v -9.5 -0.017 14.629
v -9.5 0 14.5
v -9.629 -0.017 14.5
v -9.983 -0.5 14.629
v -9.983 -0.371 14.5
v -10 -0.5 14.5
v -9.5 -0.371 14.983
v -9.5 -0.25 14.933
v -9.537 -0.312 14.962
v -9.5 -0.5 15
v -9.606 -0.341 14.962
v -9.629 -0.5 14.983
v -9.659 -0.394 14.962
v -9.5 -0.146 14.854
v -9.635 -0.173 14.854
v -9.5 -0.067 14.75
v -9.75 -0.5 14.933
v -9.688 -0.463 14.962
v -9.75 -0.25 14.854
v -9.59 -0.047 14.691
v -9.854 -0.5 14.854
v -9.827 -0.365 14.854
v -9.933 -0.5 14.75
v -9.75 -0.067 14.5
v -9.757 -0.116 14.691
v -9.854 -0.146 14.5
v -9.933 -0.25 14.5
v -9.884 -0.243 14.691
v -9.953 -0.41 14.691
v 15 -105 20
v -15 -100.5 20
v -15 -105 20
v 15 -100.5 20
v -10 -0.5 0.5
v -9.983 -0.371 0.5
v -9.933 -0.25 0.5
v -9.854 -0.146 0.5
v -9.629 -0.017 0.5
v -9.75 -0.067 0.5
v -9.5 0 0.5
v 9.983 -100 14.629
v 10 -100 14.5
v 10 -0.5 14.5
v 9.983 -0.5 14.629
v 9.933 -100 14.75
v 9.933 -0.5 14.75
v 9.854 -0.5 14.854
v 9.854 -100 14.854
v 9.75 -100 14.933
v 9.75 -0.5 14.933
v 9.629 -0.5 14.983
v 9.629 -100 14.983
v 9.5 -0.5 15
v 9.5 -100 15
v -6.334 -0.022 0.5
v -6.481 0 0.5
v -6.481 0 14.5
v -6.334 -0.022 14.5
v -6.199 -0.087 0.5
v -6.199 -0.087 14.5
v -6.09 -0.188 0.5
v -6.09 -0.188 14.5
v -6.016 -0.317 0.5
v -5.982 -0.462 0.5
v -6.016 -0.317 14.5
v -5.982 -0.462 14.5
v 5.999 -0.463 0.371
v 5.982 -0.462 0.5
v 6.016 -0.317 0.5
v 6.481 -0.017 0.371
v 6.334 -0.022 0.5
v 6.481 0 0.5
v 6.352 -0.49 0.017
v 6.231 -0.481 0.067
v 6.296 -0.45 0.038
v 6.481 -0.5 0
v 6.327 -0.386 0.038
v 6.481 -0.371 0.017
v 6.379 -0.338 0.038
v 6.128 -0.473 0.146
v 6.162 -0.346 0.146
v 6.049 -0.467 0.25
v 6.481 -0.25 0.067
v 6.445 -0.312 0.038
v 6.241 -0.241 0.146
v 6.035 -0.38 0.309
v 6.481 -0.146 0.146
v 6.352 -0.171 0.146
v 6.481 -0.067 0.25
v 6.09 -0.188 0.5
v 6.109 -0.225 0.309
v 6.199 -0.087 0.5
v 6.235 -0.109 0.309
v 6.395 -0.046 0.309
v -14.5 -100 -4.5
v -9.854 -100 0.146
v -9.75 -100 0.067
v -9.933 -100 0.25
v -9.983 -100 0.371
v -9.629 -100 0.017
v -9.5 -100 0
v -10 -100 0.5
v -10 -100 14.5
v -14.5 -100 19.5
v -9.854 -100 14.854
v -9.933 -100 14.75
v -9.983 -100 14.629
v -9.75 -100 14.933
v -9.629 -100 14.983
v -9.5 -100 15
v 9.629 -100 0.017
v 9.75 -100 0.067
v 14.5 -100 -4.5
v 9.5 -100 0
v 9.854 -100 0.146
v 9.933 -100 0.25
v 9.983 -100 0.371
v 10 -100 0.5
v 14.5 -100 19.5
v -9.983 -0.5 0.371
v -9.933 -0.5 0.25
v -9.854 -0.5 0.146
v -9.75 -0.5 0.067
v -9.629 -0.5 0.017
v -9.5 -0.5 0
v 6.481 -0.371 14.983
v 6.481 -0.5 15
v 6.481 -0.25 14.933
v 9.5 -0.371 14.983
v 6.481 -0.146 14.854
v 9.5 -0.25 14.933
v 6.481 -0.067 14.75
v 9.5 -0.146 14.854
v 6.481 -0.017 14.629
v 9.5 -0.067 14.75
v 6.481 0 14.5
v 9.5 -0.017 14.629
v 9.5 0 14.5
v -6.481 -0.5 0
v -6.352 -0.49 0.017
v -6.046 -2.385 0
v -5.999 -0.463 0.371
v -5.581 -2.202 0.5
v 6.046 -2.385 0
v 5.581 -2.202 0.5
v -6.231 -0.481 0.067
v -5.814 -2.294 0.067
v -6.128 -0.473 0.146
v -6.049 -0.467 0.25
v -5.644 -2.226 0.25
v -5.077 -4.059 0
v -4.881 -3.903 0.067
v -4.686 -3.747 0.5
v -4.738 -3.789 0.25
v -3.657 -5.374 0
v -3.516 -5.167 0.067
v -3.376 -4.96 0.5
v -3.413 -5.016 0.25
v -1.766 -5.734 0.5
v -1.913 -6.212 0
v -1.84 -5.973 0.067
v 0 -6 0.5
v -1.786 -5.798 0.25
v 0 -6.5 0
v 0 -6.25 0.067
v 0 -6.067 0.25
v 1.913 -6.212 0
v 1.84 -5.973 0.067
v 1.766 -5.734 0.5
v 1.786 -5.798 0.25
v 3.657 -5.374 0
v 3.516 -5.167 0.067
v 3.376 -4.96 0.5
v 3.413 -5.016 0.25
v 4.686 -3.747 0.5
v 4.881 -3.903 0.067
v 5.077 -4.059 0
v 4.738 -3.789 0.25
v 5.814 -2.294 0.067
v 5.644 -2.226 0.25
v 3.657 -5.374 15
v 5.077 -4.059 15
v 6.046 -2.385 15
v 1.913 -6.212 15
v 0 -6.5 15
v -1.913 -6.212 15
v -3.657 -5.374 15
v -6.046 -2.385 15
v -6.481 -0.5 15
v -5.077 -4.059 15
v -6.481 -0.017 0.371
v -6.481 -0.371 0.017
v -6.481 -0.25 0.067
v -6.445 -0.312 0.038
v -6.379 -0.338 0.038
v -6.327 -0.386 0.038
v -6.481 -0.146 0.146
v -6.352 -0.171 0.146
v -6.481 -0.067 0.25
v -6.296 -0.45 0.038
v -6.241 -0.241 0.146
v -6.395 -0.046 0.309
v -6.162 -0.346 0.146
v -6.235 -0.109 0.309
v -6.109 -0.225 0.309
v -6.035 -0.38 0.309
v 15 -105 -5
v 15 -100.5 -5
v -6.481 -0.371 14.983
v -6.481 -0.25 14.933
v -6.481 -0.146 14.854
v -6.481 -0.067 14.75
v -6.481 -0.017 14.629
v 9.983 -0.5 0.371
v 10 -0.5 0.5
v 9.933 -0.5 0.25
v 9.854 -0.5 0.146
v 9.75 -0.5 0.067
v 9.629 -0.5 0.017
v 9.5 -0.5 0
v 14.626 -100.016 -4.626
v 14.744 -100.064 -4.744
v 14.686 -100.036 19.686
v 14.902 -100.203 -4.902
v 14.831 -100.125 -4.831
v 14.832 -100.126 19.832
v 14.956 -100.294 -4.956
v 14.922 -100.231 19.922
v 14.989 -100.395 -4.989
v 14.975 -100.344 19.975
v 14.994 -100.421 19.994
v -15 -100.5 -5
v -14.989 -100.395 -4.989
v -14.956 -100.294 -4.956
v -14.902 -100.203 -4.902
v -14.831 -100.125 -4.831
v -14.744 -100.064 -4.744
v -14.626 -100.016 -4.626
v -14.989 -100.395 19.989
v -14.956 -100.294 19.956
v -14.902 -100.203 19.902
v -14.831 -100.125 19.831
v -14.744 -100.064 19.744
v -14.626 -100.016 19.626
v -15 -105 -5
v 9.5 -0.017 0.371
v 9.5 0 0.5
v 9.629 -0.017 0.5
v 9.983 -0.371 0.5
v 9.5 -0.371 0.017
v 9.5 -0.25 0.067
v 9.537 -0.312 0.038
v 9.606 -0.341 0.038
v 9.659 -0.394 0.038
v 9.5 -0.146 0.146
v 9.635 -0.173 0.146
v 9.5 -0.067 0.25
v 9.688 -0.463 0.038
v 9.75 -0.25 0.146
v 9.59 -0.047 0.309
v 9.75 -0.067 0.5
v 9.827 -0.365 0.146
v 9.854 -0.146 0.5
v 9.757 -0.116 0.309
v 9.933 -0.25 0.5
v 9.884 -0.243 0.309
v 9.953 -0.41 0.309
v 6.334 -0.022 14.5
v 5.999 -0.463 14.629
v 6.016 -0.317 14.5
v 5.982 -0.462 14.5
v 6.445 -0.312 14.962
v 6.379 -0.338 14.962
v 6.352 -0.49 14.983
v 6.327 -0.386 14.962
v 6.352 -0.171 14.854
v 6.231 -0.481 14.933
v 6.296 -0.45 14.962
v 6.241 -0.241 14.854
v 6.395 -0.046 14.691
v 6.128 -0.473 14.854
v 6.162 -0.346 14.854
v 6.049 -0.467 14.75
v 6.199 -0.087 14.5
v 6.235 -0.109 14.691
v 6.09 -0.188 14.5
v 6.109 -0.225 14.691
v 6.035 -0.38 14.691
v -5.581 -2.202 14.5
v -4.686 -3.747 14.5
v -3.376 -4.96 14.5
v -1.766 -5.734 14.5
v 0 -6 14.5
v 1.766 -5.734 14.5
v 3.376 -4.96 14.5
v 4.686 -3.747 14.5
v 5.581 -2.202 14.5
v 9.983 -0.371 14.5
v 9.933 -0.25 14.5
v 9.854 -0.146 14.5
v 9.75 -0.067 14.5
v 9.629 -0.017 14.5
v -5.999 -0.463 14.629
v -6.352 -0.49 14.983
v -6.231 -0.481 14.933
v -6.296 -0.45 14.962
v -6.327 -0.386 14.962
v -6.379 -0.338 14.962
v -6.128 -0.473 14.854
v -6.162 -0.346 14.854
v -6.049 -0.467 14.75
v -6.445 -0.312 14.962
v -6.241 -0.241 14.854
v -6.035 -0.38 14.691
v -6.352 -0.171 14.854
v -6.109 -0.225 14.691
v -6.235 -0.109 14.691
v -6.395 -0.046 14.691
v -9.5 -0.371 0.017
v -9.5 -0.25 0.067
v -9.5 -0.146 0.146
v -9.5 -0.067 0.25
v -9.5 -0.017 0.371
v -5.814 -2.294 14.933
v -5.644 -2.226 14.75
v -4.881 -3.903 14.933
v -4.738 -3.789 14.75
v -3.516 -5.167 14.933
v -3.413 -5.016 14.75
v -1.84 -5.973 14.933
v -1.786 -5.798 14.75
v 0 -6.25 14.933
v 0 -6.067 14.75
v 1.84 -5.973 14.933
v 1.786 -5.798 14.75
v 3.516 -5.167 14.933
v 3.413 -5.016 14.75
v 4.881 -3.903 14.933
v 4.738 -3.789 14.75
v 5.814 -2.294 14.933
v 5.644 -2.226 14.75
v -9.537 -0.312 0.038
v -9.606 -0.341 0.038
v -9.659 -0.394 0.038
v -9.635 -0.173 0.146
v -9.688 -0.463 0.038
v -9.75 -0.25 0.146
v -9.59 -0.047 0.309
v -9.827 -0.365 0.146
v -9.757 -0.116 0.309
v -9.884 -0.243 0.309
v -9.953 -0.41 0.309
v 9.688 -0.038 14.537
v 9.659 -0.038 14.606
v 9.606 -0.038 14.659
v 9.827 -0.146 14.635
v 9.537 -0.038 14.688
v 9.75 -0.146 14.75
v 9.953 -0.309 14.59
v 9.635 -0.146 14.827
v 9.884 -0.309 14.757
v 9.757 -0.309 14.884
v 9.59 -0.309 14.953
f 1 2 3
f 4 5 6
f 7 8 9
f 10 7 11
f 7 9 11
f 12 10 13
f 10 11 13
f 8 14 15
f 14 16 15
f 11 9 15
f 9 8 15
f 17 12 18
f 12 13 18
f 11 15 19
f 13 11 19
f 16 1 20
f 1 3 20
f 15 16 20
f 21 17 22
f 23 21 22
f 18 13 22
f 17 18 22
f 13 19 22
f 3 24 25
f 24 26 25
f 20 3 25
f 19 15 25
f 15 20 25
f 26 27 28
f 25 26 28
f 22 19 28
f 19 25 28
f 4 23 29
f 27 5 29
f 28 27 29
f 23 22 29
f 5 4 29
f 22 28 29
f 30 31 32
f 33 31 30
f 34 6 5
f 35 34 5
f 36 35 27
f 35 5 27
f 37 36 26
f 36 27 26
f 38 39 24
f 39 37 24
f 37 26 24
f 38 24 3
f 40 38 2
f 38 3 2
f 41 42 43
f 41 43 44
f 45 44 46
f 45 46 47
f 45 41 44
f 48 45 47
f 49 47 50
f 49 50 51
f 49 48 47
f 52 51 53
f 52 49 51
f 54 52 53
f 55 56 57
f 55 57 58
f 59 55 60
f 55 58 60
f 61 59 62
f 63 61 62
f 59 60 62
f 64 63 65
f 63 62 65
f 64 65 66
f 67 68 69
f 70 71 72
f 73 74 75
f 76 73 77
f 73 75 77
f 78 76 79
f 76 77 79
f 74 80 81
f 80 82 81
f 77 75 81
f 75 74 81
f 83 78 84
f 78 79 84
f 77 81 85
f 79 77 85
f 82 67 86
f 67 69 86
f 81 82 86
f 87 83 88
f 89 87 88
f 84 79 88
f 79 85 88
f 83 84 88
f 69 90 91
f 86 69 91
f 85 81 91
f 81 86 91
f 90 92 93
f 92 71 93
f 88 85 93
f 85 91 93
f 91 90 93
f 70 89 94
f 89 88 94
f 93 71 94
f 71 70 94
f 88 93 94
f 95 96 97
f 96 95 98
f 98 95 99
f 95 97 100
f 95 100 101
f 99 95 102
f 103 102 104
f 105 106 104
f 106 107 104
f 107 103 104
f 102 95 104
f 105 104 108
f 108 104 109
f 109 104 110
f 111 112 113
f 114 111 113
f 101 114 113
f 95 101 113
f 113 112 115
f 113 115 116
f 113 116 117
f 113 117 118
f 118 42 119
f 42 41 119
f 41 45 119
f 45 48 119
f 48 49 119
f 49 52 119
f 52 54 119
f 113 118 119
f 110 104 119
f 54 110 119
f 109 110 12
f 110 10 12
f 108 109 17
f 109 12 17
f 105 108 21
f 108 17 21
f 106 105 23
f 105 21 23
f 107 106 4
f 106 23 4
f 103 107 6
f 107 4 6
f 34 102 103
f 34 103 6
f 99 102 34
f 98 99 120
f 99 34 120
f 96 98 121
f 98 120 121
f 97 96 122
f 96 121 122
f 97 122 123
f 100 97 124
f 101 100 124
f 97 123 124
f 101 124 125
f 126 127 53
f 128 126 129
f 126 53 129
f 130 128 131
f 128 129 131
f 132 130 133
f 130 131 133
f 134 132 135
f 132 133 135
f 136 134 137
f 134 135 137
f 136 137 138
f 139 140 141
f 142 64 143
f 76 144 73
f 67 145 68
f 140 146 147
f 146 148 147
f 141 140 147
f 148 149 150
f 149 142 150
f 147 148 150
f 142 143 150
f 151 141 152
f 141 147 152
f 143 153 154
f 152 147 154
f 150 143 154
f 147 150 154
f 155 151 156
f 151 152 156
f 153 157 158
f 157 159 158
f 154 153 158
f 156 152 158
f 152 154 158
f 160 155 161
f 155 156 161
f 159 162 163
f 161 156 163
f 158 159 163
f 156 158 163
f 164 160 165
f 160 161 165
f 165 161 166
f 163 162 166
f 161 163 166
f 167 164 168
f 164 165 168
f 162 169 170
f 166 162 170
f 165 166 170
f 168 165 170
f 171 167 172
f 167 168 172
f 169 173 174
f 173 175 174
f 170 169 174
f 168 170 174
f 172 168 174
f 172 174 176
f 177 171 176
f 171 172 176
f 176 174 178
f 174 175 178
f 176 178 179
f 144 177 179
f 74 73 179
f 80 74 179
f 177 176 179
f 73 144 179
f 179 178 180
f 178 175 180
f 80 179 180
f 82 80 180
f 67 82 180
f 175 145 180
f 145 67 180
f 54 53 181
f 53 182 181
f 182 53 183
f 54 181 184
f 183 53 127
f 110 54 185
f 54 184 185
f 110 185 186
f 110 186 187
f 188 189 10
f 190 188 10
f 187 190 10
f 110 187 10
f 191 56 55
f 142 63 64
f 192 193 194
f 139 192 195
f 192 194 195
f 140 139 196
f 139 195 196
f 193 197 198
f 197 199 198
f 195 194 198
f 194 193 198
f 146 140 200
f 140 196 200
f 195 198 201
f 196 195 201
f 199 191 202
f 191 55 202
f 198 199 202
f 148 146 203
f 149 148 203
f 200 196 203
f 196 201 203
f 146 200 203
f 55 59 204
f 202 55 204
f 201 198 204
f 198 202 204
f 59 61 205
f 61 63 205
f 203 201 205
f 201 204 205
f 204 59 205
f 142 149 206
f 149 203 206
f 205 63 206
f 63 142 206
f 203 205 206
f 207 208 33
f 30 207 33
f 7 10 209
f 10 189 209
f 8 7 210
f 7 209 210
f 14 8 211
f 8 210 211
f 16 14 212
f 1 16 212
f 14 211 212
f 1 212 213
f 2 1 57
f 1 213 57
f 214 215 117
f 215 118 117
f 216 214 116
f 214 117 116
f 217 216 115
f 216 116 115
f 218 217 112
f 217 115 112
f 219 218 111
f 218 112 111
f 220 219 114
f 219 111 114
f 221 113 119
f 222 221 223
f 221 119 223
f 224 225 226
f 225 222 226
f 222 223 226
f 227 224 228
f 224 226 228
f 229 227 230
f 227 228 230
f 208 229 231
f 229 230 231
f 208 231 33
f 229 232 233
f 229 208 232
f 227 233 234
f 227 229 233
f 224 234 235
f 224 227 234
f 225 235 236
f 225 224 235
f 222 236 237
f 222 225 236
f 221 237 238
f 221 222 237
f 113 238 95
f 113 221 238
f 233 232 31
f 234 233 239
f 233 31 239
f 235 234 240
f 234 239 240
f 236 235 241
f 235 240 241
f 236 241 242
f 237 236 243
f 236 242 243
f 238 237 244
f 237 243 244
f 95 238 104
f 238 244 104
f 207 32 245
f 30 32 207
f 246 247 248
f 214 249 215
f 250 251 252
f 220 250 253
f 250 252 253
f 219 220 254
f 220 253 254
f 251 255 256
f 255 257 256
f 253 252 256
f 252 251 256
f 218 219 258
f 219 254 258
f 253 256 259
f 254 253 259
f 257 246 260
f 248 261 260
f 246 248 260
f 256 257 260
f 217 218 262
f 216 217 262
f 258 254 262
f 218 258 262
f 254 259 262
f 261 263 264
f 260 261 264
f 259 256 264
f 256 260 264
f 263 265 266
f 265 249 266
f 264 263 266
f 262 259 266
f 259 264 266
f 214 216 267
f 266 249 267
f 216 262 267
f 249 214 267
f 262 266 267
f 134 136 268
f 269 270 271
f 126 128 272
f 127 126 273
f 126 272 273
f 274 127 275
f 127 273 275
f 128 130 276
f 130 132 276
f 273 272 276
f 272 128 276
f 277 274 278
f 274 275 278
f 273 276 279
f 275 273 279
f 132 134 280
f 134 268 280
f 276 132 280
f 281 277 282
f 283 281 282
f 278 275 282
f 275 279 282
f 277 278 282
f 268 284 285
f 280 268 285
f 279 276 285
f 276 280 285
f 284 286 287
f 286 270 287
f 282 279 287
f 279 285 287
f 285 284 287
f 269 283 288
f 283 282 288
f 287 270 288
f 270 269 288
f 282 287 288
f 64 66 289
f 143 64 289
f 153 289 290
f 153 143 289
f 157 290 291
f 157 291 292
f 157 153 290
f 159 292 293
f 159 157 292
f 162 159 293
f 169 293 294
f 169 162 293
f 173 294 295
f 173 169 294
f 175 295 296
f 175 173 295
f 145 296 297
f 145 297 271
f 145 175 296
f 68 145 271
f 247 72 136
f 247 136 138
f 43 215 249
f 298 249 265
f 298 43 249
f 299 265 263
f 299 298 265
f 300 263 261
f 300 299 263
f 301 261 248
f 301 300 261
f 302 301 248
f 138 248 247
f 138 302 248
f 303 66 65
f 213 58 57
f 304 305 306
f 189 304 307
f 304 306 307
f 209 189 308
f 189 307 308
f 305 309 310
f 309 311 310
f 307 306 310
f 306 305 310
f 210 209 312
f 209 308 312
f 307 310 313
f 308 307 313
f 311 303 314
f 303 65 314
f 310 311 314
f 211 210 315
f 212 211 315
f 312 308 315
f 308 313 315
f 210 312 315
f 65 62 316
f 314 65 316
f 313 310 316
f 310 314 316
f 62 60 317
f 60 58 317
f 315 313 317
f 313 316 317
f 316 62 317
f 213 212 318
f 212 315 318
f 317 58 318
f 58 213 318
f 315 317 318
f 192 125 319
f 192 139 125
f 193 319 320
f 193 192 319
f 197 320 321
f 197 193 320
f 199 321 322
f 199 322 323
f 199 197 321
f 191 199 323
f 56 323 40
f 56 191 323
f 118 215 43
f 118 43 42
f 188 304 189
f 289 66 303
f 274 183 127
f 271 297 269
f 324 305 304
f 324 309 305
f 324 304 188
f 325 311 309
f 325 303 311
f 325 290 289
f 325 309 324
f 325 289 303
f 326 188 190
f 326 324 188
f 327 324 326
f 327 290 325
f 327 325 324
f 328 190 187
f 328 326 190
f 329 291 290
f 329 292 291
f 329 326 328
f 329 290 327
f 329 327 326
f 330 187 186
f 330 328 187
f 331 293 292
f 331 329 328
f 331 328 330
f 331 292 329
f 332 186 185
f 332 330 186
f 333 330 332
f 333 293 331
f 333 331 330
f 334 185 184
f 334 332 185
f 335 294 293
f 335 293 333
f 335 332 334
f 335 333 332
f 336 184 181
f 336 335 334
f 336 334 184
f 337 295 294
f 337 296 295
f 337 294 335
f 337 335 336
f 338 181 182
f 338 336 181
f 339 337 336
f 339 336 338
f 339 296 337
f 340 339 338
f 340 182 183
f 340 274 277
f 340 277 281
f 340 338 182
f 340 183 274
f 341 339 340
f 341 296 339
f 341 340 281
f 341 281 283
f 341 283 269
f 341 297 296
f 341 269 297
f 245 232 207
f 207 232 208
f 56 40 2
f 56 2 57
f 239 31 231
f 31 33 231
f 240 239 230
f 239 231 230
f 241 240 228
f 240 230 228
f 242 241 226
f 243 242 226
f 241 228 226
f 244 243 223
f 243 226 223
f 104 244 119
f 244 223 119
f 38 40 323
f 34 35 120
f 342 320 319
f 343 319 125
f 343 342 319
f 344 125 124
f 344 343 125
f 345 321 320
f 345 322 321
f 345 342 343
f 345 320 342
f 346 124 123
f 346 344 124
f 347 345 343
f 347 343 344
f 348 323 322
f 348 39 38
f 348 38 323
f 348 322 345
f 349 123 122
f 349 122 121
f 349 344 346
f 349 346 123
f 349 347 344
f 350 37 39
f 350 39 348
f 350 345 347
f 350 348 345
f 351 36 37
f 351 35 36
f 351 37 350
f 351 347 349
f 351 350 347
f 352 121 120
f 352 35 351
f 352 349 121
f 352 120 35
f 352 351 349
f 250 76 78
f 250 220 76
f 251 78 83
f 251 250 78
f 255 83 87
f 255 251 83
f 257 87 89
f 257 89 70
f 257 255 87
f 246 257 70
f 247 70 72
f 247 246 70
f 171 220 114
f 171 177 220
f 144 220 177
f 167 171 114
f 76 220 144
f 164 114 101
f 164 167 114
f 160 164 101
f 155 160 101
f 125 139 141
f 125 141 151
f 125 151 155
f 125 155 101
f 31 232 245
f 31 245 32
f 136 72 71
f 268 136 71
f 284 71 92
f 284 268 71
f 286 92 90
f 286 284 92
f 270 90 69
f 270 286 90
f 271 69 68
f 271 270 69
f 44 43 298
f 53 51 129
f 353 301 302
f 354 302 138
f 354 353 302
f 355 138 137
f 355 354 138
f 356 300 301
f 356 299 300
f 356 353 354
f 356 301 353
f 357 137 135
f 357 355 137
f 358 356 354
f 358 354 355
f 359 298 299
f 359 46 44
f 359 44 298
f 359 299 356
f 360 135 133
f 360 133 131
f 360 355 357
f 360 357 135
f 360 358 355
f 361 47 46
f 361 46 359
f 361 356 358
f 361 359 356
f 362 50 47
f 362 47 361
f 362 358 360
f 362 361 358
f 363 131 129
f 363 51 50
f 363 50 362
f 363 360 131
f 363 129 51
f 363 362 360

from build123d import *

# Parameters (mm, degrees)
BOSS_EXTRU_1_DEPTH = 15
ESQUISSE2_W        = 30
ESQUISSE2_H        = 25
BOSS_EXTRU_2_DEPTH = 5
CONG_1_R           = 0.5


with BuildPart() as part:
    # Esquisse1 → Boss.-Extru.1 (new body)
    with BuildSketch(Plane.XY):
        with BuildLine():
            Line((6, 0), (10, 0))
            Line((10, 0), (10, -100))
            Line((10, -100), (-10, -100))
            Line((-10, -100), (-10, 0))
            Line((-10, 0), (-6, 0))
            ThreePointArc((-6, 0), (0, -6), (6, 0))
        make_face()
    extrude(amount=BOSS_EXTRU_1_DEPTH)

    # Esquisse2 → Boss.-Extru.2 (add)
    with BuildSketch(Plane.XZ.offset(100)):
        with Locations((0, 7.5)):
            Rectangle(ESQUISSE2_W, ESQUISSE2_H)
    extrude(amount=BOSS_EXTRU_2_DEPTH)

    # Congé1
    cong_1_edges = [part.edges().sort_by_distance(p)[0] for p in [
        (10, -50, 15),
        (-10, 0, 7.5),
        (-6, 0, 7.5),
        (6, 0, 7.5),
        (10, 0, 7.5),
        (8, 0, 15),
        (0, -6, 15),
        (-15, -100, 7.5),
        (-8, 0, 15),
        (0, -100, -5),
        (15, -100, 7.5),
        (0, -100, 20),
        (-10, -50, 15),
        (-8, 0, 0),
        (0, -6, 0),
        (8, 0, 0),
        (10, -50, 0),
        (-10, -50, 0),
    ]]
    fillet(cong_1_edges, radius=CONG_1_R)


solid = part.part
